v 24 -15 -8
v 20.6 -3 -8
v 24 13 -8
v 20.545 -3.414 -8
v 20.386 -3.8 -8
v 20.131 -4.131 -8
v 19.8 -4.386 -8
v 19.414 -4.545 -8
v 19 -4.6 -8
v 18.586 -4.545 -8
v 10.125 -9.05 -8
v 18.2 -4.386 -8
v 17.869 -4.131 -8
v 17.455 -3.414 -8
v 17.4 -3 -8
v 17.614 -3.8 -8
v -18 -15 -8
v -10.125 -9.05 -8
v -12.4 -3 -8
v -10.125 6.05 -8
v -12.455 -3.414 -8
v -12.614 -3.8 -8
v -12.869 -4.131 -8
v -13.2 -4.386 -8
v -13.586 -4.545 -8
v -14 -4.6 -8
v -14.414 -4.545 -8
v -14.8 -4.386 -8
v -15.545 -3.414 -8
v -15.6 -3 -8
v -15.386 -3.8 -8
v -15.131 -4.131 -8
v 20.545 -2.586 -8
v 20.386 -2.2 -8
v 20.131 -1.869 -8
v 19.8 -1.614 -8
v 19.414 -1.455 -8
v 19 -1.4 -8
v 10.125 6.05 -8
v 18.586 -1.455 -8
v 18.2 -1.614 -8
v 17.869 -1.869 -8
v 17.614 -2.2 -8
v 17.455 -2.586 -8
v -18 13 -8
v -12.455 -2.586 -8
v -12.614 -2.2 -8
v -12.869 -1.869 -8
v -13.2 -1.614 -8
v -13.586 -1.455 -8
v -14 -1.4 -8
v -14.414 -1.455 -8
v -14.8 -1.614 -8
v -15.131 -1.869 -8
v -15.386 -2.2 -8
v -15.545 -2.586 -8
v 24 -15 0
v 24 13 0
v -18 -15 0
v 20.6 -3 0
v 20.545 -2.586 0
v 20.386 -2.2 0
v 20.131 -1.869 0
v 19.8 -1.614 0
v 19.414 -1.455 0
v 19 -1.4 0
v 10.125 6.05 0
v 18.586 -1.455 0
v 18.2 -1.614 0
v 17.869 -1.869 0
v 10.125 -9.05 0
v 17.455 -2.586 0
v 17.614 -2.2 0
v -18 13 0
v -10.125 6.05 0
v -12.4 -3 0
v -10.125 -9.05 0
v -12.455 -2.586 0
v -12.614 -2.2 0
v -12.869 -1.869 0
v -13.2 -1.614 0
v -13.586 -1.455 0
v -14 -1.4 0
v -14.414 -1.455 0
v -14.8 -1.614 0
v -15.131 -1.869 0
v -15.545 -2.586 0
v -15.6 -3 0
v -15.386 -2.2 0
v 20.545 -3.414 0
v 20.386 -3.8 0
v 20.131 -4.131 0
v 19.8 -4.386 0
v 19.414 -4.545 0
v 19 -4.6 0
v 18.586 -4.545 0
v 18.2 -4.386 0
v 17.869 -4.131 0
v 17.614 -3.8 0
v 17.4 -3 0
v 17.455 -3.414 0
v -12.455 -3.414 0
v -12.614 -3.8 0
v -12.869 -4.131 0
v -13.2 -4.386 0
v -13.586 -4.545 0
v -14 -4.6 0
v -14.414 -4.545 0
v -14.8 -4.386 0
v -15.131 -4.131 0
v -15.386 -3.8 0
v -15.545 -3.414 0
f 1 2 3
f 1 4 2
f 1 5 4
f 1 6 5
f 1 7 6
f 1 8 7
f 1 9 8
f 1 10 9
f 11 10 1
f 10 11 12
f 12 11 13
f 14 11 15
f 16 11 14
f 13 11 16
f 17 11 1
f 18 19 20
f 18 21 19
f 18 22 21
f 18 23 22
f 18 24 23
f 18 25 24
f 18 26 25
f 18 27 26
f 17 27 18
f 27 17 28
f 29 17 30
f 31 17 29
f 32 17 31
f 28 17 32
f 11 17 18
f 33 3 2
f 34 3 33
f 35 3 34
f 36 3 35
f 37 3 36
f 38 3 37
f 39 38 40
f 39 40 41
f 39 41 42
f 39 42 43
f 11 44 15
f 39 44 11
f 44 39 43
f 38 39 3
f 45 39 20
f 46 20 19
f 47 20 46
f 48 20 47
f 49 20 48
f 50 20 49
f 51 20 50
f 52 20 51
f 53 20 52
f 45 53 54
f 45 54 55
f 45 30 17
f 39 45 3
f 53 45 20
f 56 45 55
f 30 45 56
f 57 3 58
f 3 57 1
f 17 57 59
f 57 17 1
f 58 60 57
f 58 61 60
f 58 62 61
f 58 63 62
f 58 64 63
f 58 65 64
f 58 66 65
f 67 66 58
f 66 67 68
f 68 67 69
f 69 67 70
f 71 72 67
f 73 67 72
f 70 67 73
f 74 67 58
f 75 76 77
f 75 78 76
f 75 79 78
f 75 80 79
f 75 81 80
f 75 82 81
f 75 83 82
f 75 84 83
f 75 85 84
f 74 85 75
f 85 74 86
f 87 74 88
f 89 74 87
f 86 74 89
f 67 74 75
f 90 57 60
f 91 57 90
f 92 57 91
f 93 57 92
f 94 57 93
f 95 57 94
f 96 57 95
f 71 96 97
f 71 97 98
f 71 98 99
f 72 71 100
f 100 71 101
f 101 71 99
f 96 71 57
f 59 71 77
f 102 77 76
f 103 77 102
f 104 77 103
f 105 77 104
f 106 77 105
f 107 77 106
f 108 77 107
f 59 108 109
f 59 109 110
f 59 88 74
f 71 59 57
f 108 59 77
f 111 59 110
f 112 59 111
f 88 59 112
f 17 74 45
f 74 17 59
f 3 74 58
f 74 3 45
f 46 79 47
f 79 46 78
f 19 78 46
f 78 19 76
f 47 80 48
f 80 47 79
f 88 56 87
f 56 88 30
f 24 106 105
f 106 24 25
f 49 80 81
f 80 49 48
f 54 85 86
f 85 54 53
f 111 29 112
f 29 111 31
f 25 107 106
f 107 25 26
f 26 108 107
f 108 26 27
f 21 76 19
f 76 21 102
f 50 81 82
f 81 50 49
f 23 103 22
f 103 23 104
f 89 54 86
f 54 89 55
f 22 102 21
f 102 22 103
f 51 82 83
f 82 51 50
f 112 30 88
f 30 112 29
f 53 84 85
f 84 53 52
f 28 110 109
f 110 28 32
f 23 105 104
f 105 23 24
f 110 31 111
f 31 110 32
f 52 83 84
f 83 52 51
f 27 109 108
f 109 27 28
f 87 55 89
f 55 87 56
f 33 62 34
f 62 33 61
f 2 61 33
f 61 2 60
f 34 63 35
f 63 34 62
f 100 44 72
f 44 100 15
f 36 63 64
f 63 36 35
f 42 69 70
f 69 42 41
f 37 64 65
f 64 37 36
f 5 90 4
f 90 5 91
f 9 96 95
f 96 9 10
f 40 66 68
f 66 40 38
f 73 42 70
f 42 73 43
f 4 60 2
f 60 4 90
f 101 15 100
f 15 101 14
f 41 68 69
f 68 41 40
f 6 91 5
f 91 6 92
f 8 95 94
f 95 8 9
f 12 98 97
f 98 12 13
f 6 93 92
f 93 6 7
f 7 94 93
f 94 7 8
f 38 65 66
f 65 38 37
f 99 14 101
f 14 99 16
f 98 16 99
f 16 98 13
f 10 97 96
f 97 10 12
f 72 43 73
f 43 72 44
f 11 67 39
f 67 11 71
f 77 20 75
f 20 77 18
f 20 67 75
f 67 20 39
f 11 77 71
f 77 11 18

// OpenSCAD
// file: ../OpenSCAD_Modules/cube_vround.scad
module cube_vround(
	size=[10,10,10],
	round_corners=[true,true,true,true],
	rounding=3,
	center_xy=false,
	center_z=false,
	attach=0,
	wall_attach=0,
	quality=2, //integer from 1 to infinity
)
{
	assert(len(size)==3);
	assert(len(round_corners)==4);
	assert(rounding>0);
	assert(rounding<=size[0]/2);
	assert(rounding<=size[1]/2);
	assert(quality>0);
	assert(attach>=0);
	assert(wall_attach>=0);
	height=size[2]+attach;
	cyl_r=rounding+wall_attach;
	cyl_mvx=size[0]/2-rounding;
	cyl_mvy=size[1]/2-rounding;
	cube_szx=size[0]/2;
	cube_szy=size[1]/2;
	cube_mvx=cube_szx/2+wall_attach;
	cube_mvy=cube_szy/2+wall_attach;
	translate([center_xy?0:cube_szx,center_xy?0:cube_szy,center_z?-attach/2:(size[2]-attach)/2])
		hull()
		{
			if(round_corners[0])
				translate([cyl_mvx,cyl_mvy])
					cylinder(r=cyl_r,h=height,$fn=12*quality,center=true);
			else
				translate([cube_mvx,cube_mvy])
					cube([cube_szx,cube_szy,height],center=true);
			if(round_corners[1])
				translate([cyl_mvx,-cyl_mvy])
					cylinder(r=cyl_r,h=height,$fn=12*quality,center=true);
			else
				translate([cube_mvx,-cube_mvy])
					cube([cube_szx,cube_szy,height],center=true);
			if(round_corners[2])
				translate([-cyl_mvx,-cyl_mvy])
					cylinder(r=cyl_r,h=height,$fn=12*quality,center=true);
			else
				translate([-cube_mvx,-cube_mvy])
					cube([cube_szx,cube_szy,height],center=true);
			if(round_corners[3])
				translate([-cyl_mvx,cyl_mvy])
					cylinder(r=cyl_r,h=height,$fn=12*quality,center=true);
			else
				translate([-cube_mvx,cube_mvy])
					cube([cube_szx,cube_szy,height],center=true);
		};
}

//example
cube_vround(round_corners=[true,false,true,false],
size=[10,20,6],
attach=0.1,
wall_attach=0.1,
rounding=3,
center_xy=true,center_z=false);
// main file
use <EffectorMount_Alt.scad>


module HotendMount
(
	//mount base parameters
	center_hole_diam=4.6,
	side_hole_diam=3.2,
	side_hole1_pos=[-14,-3],
	side_hole2_pos=[19,-3],
	base_points=[[-18,-15],[24,-15],[24,13],[-18,13]],
	base_height=8,
	//hotend block params
	hotend_block_size=[20.25,12.1,27],
	hotend_block_front=3, // front cut
	screws_diff=14,

	quality=2,
)
{
	cutClr=0.1;


	difference()
	{
		//mount base
		translate([0,0,-base_height])
		linear_extrude(height=base_height)
		polygon(points=base_points);

		//central shaft
		translate([0,0,-base_height-cutClr])
		cylinder(d=center_hole_diam,h=base_height+2*cutClr,$fn=quality*12);

		//left mount hole
		translate([side_hole1_pos[0],side_hole1_pos[1],-base_height-cutClr])
		cylinder(d=side_hole_diam,h=base_height+2*cutClr,$fn=quality*12);

		//right mount hole
		translate([side_hole2_pos[0],side_hole2_pos[1],-base_height-cutClr])
		cylinder(d=side_hole_diam,h=base_height+2*cutClr,$fn=quality*12);

		//hotend block cut
		translate([-hotend_block_size[0]/2, -hotend_block_size[1]/2-hotend_block_front, -hotend_block_size[2]-cutClr])
		cube(size=[hotend_block_size[0],hotend_block_size[1]+hotend_block_front,hotend_block_size[2]+2*cutClr],center=false);
	}

}


//color([0.25,0.25,0.25])
//EffectorMount(center_xy=true,center_z=true,rotate_motor=true);

HotendMount();
